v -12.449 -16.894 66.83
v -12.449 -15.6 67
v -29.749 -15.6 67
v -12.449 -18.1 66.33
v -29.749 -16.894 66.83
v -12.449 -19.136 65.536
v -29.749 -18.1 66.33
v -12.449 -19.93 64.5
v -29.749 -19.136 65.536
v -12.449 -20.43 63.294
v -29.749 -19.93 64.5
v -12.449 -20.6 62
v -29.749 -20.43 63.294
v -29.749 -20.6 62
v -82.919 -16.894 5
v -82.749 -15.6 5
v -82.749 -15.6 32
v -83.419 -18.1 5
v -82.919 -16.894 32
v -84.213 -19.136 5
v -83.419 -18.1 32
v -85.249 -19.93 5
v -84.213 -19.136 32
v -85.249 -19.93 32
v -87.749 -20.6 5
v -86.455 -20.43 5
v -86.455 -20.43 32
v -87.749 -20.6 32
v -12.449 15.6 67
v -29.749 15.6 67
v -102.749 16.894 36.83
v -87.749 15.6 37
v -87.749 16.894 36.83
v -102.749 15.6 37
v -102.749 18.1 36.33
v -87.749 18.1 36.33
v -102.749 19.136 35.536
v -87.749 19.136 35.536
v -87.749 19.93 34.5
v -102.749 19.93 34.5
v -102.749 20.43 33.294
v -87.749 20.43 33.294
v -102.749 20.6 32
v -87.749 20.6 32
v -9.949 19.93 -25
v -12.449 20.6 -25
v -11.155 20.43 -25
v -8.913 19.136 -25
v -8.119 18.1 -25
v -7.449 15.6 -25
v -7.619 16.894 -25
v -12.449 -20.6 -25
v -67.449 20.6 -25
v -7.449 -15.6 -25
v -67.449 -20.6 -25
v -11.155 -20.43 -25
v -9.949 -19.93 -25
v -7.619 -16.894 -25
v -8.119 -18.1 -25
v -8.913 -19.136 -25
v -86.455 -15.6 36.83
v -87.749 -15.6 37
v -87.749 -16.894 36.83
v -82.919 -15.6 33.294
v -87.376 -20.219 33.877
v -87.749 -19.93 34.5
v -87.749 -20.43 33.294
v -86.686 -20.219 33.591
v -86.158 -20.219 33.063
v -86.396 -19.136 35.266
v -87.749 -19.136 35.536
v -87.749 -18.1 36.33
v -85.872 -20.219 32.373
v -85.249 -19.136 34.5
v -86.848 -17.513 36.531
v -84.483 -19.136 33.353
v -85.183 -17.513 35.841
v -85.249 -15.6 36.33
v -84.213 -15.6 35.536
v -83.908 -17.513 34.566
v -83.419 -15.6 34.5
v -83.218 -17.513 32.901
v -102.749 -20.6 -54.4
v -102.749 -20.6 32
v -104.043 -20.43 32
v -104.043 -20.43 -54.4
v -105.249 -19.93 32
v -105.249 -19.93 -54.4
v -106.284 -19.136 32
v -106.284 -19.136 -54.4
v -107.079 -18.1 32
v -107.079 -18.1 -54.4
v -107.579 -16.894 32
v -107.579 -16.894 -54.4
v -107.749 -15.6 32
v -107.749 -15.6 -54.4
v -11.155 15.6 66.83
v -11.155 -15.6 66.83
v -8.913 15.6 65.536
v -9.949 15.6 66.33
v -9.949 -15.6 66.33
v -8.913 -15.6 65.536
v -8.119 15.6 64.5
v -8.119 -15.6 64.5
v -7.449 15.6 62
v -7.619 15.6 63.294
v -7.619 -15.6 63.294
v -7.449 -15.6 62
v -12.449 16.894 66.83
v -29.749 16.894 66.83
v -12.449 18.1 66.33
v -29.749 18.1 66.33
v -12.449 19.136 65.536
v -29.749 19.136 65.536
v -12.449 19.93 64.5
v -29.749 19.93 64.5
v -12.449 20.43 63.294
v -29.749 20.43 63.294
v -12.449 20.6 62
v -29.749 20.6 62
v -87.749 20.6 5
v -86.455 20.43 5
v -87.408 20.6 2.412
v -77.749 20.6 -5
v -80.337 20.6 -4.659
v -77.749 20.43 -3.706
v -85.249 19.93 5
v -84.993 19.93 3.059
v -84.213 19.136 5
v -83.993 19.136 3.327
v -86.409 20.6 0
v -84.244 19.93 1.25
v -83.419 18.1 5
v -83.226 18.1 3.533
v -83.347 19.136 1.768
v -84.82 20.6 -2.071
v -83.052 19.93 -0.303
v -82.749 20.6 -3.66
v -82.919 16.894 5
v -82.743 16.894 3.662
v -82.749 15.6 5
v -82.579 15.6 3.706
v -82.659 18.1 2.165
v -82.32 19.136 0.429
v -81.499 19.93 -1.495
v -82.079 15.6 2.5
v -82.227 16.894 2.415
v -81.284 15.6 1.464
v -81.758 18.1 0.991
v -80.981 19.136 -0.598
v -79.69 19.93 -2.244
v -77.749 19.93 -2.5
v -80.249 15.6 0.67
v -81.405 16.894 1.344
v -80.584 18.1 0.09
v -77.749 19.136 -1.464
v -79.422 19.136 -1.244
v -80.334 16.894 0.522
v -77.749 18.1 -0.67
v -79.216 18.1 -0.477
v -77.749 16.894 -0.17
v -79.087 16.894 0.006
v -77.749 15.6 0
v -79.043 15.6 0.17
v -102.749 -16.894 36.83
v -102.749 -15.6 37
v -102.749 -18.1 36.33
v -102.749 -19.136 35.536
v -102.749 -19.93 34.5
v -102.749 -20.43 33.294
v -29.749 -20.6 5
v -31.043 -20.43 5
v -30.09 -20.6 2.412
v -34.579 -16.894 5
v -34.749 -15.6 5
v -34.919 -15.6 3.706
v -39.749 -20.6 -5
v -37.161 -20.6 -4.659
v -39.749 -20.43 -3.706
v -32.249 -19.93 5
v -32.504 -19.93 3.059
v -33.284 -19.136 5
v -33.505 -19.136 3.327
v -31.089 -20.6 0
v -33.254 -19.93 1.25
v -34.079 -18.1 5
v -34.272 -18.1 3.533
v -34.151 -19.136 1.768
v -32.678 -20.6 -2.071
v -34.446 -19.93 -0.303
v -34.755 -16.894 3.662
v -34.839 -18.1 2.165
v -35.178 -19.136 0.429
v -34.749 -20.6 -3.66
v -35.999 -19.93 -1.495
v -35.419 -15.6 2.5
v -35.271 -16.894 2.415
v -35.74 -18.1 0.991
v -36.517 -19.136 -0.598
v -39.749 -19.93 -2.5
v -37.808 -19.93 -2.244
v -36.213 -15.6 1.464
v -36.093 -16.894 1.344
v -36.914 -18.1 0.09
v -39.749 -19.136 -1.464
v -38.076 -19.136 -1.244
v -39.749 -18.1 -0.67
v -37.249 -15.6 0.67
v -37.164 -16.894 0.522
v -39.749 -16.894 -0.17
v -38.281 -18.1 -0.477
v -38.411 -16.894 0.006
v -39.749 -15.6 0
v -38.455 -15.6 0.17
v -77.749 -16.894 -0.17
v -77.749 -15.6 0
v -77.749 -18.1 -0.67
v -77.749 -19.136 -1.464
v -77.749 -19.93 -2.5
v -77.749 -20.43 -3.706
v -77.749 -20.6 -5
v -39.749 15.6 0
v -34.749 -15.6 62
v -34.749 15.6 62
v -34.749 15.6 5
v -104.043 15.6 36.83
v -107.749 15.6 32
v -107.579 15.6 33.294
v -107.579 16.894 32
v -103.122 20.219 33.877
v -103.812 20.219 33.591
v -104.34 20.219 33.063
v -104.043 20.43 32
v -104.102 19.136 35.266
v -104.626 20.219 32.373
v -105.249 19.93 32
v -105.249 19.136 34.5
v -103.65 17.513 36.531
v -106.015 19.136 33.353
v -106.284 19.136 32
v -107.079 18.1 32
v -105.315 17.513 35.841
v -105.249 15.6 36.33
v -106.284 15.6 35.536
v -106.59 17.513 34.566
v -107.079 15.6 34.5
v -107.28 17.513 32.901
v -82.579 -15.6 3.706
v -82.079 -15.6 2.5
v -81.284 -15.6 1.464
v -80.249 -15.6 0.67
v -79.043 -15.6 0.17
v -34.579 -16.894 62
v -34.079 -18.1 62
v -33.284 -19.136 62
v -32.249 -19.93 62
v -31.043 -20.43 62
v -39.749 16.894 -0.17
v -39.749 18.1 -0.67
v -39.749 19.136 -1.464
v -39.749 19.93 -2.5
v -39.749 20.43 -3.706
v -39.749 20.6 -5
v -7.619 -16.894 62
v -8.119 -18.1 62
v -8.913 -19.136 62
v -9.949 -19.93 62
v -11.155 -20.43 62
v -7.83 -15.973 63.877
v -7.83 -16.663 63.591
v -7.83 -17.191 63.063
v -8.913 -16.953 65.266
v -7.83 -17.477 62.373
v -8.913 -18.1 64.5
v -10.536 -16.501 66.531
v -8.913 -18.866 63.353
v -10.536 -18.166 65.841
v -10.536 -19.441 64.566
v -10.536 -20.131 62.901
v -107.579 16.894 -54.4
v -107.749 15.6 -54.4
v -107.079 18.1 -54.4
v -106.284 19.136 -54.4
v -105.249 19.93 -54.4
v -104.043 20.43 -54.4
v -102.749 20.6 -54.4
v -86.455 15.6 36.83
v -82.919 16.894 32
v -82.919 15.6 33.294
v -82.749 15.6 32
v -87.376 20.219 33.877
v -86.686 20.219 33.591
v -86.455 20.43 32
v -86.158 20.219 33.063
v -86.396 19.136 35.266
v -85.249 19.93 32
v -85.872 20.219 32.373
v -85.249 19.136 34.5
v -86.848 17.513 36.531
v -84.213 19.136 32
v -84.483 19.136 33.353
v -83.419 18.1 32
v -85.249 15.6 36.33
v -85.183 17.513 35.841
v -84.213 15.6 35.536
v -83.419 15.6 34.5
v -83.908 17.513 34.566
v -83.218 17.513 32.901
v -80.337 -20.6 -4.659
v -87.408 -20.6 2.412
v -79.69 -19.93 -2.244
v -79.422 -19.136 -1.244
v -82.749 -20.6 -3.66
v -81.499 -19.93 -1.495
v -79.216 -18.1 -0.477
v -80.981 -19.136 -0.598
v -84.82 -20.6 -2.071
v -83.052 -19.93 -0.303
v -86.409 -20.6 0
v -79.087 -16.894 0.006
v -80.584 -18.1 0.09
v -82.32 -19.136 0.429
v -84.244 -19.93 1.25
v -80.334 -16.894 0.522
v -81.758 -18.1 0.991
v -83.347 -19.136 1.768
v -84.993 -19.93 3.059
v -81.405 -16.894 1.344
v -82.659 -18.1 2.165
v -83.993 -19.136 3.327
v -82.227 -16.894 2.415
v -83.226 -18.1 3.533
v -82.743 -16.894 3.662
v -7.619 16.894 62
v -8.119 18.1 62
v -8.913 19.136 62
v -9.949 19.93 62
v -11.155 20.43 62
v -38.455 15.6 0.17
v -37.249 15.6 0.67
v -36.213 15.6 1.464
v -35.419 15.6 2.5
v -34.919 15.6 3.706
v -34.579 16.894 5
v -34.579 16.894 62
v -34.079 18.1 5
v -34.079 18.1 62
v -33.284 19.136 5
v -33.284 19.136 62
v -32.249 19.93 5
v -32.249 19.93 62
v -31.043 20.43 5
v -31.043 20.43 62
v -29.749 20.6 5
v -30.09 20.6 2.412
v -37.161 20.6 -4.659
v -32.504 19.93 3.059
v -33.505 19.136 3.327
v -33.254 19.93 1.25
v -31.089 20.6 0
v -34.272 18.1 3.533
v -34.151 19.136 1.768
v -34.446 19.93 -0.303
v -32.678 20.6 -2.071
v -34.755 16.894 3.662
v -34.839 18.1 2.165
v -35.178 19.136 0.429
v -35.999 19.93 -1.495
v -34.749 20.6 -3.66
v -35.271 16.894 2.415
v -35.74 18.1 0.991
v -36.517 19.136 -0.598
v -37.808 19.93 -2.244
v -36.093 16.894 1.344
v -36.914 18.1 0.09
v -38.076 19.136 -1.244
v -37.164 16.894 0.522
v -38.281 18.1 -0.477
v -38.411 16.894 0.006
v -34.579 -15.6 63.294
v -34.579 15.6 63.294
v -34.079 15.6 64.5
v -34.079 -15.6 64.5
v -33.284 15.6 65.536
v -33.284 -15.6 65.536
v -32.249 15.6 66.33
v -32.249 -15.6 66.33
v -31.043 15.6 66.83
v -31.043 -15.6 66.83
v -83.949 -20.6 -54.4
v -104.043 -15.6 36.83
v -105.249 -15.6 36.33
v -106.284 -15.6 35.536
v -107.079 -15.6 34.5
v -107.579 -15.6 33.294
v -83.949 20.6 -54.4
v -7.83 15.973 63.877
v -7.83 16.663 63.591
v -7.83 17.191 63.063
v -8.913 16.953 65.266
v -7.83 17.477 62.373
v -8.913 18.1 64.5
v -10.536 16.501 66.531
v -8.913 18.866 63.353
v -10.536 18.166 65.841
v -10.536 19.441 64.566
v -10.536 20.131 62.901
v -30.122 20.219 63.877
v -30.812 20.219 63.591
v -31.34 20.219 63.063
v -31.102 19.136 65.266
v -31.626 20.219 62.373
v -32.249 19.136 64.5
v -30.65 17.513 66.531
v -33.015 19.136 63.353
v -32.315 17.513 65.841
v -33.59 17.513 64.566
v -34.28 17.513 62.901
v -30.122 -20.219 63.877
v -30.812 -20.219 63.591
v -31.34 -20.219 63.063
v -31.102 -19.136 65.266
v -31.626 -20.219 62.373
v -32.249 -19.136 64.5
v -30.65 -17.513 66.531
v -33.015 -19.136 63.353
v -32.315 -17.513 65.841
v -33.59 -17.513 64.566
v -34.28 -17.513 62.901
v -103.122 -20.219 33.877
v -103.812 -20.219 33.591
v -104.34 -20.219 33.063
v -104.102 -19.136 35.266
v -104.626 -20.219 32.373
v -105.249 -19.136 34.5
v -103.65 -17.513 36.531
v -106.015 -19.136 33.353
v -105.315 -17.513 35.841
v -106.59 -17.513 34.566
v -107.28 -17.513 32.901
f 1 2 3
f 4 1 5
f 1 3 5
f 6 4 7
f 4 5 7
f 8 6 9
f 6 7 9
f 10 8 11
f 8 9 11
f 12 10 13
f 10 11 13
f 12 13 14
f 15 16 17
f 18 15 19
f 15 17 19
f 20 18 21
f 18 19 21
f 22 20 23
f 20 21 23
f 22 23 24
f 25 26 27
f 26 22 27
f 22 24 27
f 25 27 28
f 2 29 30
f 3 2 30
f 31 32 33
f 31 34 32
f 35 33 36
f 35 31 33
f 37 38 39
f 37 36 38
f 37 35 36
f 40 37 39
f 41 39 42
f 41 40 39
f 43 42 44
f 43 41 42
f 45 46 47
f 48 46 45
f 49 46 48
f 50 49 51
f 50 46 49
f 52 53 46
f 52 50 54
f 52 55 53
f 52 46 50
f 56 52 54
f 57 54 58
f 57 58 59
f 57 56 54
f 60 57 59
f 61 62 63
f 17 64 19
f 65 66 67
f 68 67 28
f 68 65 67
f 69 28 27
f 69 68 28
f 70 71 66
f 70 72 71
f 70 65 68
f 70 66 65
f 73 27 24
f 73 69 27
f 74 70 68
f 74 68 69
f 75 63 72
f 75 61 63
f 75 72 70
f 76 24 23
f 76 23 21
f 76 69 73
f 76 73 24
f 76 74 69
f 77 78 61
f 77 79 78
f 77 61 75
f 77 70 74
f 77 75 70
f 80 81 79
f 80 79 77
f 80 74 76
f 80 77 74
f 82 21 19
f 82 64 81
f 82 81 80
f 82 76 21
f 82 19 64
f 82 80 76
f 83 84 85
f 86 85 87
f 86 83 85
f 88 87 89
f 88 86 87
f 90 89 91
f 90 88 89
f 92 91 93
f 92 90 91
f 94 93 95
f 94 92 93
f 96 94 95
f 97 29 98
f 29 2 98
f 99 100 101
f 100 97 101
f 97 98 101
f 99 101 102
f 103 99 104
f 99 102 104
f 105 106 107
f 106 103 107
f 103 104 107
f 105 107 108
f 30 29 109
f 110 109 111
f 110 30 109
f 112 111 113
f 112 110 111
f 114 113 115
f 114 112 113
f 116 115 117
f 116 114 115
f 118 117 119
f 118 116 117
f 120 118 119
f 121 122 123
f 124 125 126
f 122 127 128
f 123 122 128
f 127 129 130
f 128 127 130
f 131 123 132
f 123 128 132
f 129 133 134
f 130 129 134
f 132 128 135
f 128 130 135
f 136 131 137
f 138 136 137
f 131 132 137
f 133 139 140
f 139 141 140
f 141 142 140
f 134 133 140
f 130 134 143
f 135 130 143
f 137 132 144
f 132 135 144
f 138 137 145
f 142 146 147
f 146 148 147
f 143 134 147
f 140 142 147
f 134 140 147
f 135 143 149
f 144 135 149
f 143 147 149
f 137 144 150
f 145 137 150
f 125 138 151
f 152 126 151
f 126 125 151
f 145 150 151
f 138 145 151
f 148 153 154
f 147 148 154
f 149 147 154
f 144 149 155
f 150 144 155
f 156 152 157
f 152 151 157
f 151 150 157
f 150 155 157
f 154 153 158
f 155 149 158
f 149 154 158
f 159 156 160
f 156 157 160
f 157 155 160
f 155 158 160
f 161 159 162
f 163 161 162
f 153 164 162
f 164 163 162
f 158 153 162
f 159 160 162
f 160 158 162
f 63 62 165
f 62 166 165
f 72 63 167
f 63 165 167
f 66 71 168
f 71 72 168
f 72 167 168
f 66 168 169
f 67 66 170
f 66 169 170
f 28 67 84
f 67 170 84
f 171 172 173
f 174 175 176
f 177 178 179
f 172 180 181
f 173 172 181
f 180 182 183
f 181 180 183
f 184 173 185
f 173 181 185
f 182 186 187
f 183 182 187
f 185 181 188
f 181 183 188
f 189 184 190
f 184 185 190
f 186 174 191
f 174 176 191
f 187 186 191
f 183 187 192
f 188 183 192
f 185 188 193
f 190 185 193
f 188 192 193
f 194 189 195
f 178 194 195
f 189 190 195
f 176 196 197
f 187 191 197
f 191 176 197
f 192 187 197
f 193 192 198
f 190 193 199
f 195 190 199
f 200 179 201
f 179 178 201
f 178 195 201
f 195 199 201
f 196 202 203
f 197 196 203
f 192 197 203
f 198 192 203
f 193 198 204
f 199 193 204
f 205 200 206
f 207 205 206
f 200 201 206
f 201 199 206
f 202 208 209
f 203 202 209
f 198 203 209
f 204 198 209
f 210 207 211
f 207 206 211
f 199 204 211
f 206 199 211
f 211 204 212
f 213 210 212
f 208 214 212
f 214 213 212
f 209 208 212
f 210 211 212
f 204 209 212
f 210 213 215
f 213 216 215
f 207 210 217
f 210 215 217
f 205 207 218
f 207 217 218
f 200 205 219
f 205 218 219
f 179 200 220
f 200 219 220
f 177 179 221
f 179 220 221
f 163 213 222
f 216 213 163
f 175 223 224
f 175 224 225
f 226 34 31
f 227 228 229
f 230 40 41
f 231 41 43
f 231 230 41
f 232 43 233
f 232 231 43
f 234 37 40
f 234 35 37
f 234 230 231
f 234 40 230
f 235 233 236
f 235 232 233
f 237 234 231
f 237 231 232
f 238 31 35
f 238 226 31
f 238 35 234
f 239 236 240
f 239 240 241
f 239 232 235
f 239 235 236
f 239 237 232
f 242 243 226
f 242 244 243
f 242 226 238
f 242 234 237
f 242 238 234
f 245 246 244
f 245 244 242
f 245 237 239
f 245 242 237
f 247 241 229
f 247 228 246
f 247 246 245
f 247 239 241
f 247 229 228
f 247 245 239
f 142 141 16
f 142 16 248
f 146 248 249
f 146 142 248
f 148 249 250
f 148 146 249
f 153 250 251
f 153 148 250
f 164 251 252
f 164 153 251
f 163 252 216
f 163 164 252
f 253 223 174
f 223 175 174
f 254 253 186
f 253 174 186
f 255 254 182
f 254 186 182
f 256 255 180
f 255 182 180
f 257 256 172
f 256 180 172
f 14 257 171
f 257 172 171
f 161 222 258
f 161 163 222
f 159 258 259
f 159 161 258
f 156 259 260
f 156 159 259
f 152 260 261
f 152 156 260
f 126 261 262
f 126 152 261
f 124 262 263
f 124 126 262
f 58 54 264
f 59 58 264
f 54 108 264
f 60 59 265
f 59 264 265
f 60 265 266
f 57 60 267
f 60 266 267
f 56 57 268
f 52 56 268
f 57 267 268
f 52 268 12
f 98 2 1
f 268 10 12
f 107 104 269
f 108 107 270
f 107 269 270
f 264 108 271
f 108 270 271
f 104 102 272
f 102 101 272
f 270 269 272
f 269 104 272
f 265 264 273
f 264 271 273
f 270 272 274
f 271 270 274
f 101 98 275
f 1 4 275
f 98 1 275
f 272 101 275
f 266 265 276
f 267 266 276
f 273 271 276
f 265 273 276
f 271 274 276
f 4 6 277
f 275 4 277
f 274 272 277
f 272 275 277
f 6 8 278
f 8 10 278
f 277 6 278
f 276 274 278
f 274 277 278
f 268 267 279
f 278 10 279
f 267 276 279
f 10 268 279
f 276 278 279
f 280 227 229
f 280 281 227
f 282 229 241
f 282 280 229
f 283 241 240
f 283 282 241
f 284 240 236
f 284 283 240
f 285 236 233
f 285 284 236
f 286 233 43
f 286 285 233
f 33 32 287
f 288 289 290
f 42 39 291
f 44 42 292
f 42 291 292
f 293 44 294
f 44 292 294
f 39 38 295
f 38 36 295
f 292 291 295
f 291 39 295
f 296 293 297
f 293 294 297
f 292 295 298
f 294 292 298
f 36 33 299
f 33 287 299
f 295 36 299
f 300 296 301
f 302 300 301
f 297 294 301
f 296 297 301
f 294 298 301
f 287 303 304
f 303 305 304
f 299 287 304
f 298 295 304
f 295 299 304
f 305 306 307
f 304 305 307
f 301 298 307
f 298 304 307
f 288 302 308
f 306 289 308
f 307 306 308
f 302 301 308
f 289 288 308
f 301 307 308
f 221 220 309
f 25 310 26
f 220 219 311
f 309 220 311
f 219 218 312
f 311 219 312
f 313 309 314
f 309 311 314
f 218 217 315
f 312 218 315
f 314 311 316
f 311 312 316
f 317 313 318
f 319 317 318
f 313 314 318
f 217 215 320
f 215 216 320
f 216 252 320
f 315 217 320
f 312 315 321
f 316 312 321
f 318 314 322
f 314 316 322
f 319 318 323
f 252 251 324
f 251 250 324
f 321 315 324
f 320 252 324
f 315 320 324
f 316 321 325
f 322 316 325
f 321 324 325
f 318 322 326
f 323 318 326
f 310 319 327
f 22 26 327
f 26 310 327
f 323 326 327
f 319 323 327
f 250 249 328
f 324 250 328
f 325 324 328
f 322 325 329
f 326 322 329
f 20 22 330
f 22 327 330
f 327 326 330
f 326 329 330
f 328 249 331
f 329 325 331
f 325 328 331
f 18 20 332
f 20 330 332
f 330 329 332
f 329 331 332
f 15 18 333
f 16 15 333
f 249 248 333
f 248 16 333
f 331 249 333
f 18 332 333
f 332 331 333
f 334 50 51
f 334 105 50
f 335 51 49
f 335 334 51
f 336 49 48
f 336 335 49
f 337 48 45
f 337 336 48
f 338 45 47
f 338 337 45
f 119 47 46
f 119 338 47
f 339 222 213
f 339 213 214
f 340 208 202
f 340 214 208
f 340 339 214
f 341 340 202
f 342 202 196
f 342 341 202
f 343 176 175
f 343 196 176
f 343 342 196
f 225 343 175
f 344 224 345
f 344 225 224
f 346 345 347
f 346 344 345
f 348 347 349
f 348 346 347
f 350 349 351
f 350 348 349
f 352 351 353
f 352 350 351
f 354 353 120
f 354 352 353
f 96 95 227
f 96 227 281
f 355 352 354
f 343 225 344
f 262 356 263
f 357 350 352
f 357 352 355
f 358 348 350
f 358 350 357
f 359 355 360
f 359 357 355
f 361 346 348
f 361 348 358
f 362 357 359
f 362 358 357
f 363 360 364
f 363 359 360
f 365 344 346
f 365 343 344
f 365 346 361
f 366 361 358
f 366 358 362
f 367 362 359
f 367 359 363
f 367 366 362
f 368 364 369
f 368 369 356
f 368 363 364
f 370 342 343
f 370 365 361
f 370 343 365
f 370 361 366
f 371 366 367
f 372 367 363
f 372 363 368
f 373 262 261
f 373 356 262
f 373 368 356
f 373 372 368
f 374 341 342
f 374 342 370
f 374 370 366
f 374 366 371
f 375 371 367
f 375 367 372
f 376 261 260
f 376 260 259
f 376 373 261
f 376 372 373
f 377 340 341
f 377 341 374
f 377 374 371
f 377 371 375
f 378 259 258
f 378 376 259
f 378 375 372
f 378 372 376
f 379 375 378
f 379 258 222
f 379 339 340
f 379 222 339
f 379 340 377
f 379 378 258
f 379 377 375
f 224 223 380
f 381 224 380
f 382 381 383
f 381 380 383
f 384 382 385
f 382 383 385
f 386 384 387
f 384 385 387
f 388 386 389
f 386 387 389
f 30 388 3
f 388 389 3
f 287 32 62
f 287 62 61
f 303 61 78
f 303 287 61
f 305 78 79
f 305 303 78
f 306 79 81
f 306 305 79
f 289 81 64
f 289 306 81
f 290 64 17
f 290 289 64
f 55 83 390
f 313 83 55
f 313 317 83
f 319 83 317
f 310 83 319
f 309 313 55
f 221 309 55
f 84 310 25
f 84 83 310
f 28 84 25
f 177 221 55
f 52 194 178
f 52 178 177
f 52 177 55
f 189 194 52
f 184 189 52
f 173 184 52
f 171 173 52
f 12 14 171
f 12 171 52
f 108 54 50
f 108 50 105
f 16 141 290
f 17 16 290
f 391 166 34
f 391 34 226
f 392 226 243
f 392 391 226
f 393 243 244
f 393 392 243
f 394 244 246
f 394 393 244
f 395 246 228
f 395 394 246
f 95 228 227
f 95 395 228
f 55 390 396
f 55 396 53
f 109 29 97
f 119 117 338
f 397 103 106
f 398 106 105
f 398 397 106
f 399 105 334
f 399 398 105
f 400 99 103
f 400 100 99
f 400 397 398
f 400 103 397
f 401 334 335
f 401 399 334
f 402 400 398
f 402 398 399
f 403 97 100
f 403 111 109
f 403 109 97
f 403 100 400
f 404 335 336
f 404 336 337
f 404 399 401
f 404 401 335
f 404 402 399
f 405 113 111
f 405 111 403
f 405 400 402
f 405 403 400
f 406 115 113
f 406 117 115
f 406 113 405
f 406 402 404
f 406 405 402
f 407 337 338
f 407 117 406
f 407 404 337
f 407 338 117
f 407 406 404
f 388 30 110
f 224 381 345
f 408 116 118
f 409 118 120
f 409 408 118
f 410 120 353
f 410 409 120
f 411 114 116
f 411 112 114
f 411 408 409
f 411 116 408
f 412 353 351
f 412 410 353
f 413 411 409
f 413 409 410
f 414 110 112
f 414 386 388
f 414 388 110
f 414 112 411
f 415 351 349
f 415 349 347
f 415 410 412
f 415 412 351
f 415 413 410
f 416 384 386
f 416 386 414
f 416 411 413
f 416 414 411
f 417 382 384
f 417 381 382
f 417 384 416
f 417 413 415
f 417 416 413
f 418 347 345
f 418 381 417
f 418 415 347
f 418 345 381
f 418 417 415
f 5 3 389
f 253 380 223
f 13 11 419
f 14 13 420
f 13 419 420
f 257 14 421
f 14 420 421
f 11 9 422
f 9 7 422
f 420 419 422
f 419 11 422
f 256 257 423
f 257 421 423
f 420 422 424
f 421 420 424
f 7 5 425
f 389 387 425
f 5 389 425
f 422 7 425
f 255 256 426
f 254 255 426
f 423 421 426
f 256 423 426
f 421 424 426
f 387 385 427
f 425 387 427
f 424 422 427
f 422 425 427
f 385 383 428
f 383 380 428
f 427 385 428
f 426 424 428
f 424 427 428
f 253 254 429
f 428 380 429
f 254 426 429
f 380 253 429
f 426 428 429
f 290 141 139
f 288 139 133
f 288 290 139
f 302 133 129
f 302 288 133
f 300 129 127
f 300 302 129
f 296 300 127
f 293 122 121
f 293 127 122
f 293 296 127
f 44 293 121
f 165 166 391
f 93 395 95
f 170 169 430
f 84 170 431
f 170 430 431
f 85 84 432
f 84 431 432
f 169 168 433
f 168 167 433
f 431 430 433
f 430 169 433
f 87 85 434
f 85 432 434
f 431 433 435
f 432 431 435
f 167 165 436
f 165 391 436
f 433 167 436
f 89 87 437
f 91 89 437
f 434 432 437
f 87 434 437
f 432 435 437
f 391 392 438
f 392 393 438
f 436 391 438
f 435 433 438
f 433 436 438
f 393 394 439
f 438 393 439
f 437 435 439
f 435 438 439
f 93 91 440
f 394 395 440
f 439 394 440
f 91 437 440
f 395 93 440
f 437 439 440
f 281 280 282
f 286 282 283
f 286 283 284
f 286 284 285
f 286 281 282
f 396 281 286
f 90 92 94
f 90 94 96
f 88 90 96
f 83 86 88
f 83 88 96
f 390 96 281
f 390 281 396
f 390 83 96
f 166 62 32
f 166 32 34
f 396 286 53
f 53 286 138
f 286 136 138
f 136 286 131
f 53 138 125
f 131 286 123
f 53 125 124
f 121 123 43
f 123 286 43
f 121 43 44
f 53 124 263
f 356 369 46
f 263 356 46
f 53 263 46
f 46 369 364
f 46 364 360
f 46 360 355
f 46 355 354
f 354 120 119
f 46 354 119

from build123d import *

# Parameters (mm, degrees)
F1_DEPTH = 20.6
F2_R     = 5


with BuildPart() as f1:
    # F0 (on Front) → F1 (new body, symmetric)
    with BuildSketch(Plane.XZ):
        Polygon((-82.7489259505, 37), (-107.7489259505, 37), (-107.7489259505, -54.4), (-83.9489259505, -54.4), (-67.4489259505, -25), (-7.4489259505, -25), (-7.4489259505, 67), (-34.7489259505, 67), (-34.7489259505, 0), (-82.7489259505, 0), align=None)
    extrude(amount=F1_DEPTH, both=True)

    # F2
    f2_edges = [f1.edges().sort_by_distance(p)[0] for p in [
        (-107.748926, 0, 37),
        (-82.748926, 0, 37),
        (-95.248926, -20.6, 37),
        (-95.248926, 20.6, 37),
        (-82.748926, -20.6, 18.5),
        (-82.748926, 0, 0),
        (-82.748926, 20.6, 18.5),
        (-58.748926, 20.6, 0),
        (-58.748926, -20.6, 0),
        (-34.748926, 0, 0),
        (-34.748926, 0, 67),
        (-21.098926, -20.6, 67),
        (-21.098926, 20.6, 67),
        (-7.448926, 0, 67),
        (-34.748926, -20.6, 33.5),
        (-7.448926, -20.6, 21),
        (-7.448926, 20.6, 21),
        (-107.748926, -20.6, -8.7),
        (-107.748926, 20.6, -8.7),
        (-34.748926, 20.6, 33.5),
    ]]
    fillet(f2_edges, radius=F2_R)


solid = f1.part
